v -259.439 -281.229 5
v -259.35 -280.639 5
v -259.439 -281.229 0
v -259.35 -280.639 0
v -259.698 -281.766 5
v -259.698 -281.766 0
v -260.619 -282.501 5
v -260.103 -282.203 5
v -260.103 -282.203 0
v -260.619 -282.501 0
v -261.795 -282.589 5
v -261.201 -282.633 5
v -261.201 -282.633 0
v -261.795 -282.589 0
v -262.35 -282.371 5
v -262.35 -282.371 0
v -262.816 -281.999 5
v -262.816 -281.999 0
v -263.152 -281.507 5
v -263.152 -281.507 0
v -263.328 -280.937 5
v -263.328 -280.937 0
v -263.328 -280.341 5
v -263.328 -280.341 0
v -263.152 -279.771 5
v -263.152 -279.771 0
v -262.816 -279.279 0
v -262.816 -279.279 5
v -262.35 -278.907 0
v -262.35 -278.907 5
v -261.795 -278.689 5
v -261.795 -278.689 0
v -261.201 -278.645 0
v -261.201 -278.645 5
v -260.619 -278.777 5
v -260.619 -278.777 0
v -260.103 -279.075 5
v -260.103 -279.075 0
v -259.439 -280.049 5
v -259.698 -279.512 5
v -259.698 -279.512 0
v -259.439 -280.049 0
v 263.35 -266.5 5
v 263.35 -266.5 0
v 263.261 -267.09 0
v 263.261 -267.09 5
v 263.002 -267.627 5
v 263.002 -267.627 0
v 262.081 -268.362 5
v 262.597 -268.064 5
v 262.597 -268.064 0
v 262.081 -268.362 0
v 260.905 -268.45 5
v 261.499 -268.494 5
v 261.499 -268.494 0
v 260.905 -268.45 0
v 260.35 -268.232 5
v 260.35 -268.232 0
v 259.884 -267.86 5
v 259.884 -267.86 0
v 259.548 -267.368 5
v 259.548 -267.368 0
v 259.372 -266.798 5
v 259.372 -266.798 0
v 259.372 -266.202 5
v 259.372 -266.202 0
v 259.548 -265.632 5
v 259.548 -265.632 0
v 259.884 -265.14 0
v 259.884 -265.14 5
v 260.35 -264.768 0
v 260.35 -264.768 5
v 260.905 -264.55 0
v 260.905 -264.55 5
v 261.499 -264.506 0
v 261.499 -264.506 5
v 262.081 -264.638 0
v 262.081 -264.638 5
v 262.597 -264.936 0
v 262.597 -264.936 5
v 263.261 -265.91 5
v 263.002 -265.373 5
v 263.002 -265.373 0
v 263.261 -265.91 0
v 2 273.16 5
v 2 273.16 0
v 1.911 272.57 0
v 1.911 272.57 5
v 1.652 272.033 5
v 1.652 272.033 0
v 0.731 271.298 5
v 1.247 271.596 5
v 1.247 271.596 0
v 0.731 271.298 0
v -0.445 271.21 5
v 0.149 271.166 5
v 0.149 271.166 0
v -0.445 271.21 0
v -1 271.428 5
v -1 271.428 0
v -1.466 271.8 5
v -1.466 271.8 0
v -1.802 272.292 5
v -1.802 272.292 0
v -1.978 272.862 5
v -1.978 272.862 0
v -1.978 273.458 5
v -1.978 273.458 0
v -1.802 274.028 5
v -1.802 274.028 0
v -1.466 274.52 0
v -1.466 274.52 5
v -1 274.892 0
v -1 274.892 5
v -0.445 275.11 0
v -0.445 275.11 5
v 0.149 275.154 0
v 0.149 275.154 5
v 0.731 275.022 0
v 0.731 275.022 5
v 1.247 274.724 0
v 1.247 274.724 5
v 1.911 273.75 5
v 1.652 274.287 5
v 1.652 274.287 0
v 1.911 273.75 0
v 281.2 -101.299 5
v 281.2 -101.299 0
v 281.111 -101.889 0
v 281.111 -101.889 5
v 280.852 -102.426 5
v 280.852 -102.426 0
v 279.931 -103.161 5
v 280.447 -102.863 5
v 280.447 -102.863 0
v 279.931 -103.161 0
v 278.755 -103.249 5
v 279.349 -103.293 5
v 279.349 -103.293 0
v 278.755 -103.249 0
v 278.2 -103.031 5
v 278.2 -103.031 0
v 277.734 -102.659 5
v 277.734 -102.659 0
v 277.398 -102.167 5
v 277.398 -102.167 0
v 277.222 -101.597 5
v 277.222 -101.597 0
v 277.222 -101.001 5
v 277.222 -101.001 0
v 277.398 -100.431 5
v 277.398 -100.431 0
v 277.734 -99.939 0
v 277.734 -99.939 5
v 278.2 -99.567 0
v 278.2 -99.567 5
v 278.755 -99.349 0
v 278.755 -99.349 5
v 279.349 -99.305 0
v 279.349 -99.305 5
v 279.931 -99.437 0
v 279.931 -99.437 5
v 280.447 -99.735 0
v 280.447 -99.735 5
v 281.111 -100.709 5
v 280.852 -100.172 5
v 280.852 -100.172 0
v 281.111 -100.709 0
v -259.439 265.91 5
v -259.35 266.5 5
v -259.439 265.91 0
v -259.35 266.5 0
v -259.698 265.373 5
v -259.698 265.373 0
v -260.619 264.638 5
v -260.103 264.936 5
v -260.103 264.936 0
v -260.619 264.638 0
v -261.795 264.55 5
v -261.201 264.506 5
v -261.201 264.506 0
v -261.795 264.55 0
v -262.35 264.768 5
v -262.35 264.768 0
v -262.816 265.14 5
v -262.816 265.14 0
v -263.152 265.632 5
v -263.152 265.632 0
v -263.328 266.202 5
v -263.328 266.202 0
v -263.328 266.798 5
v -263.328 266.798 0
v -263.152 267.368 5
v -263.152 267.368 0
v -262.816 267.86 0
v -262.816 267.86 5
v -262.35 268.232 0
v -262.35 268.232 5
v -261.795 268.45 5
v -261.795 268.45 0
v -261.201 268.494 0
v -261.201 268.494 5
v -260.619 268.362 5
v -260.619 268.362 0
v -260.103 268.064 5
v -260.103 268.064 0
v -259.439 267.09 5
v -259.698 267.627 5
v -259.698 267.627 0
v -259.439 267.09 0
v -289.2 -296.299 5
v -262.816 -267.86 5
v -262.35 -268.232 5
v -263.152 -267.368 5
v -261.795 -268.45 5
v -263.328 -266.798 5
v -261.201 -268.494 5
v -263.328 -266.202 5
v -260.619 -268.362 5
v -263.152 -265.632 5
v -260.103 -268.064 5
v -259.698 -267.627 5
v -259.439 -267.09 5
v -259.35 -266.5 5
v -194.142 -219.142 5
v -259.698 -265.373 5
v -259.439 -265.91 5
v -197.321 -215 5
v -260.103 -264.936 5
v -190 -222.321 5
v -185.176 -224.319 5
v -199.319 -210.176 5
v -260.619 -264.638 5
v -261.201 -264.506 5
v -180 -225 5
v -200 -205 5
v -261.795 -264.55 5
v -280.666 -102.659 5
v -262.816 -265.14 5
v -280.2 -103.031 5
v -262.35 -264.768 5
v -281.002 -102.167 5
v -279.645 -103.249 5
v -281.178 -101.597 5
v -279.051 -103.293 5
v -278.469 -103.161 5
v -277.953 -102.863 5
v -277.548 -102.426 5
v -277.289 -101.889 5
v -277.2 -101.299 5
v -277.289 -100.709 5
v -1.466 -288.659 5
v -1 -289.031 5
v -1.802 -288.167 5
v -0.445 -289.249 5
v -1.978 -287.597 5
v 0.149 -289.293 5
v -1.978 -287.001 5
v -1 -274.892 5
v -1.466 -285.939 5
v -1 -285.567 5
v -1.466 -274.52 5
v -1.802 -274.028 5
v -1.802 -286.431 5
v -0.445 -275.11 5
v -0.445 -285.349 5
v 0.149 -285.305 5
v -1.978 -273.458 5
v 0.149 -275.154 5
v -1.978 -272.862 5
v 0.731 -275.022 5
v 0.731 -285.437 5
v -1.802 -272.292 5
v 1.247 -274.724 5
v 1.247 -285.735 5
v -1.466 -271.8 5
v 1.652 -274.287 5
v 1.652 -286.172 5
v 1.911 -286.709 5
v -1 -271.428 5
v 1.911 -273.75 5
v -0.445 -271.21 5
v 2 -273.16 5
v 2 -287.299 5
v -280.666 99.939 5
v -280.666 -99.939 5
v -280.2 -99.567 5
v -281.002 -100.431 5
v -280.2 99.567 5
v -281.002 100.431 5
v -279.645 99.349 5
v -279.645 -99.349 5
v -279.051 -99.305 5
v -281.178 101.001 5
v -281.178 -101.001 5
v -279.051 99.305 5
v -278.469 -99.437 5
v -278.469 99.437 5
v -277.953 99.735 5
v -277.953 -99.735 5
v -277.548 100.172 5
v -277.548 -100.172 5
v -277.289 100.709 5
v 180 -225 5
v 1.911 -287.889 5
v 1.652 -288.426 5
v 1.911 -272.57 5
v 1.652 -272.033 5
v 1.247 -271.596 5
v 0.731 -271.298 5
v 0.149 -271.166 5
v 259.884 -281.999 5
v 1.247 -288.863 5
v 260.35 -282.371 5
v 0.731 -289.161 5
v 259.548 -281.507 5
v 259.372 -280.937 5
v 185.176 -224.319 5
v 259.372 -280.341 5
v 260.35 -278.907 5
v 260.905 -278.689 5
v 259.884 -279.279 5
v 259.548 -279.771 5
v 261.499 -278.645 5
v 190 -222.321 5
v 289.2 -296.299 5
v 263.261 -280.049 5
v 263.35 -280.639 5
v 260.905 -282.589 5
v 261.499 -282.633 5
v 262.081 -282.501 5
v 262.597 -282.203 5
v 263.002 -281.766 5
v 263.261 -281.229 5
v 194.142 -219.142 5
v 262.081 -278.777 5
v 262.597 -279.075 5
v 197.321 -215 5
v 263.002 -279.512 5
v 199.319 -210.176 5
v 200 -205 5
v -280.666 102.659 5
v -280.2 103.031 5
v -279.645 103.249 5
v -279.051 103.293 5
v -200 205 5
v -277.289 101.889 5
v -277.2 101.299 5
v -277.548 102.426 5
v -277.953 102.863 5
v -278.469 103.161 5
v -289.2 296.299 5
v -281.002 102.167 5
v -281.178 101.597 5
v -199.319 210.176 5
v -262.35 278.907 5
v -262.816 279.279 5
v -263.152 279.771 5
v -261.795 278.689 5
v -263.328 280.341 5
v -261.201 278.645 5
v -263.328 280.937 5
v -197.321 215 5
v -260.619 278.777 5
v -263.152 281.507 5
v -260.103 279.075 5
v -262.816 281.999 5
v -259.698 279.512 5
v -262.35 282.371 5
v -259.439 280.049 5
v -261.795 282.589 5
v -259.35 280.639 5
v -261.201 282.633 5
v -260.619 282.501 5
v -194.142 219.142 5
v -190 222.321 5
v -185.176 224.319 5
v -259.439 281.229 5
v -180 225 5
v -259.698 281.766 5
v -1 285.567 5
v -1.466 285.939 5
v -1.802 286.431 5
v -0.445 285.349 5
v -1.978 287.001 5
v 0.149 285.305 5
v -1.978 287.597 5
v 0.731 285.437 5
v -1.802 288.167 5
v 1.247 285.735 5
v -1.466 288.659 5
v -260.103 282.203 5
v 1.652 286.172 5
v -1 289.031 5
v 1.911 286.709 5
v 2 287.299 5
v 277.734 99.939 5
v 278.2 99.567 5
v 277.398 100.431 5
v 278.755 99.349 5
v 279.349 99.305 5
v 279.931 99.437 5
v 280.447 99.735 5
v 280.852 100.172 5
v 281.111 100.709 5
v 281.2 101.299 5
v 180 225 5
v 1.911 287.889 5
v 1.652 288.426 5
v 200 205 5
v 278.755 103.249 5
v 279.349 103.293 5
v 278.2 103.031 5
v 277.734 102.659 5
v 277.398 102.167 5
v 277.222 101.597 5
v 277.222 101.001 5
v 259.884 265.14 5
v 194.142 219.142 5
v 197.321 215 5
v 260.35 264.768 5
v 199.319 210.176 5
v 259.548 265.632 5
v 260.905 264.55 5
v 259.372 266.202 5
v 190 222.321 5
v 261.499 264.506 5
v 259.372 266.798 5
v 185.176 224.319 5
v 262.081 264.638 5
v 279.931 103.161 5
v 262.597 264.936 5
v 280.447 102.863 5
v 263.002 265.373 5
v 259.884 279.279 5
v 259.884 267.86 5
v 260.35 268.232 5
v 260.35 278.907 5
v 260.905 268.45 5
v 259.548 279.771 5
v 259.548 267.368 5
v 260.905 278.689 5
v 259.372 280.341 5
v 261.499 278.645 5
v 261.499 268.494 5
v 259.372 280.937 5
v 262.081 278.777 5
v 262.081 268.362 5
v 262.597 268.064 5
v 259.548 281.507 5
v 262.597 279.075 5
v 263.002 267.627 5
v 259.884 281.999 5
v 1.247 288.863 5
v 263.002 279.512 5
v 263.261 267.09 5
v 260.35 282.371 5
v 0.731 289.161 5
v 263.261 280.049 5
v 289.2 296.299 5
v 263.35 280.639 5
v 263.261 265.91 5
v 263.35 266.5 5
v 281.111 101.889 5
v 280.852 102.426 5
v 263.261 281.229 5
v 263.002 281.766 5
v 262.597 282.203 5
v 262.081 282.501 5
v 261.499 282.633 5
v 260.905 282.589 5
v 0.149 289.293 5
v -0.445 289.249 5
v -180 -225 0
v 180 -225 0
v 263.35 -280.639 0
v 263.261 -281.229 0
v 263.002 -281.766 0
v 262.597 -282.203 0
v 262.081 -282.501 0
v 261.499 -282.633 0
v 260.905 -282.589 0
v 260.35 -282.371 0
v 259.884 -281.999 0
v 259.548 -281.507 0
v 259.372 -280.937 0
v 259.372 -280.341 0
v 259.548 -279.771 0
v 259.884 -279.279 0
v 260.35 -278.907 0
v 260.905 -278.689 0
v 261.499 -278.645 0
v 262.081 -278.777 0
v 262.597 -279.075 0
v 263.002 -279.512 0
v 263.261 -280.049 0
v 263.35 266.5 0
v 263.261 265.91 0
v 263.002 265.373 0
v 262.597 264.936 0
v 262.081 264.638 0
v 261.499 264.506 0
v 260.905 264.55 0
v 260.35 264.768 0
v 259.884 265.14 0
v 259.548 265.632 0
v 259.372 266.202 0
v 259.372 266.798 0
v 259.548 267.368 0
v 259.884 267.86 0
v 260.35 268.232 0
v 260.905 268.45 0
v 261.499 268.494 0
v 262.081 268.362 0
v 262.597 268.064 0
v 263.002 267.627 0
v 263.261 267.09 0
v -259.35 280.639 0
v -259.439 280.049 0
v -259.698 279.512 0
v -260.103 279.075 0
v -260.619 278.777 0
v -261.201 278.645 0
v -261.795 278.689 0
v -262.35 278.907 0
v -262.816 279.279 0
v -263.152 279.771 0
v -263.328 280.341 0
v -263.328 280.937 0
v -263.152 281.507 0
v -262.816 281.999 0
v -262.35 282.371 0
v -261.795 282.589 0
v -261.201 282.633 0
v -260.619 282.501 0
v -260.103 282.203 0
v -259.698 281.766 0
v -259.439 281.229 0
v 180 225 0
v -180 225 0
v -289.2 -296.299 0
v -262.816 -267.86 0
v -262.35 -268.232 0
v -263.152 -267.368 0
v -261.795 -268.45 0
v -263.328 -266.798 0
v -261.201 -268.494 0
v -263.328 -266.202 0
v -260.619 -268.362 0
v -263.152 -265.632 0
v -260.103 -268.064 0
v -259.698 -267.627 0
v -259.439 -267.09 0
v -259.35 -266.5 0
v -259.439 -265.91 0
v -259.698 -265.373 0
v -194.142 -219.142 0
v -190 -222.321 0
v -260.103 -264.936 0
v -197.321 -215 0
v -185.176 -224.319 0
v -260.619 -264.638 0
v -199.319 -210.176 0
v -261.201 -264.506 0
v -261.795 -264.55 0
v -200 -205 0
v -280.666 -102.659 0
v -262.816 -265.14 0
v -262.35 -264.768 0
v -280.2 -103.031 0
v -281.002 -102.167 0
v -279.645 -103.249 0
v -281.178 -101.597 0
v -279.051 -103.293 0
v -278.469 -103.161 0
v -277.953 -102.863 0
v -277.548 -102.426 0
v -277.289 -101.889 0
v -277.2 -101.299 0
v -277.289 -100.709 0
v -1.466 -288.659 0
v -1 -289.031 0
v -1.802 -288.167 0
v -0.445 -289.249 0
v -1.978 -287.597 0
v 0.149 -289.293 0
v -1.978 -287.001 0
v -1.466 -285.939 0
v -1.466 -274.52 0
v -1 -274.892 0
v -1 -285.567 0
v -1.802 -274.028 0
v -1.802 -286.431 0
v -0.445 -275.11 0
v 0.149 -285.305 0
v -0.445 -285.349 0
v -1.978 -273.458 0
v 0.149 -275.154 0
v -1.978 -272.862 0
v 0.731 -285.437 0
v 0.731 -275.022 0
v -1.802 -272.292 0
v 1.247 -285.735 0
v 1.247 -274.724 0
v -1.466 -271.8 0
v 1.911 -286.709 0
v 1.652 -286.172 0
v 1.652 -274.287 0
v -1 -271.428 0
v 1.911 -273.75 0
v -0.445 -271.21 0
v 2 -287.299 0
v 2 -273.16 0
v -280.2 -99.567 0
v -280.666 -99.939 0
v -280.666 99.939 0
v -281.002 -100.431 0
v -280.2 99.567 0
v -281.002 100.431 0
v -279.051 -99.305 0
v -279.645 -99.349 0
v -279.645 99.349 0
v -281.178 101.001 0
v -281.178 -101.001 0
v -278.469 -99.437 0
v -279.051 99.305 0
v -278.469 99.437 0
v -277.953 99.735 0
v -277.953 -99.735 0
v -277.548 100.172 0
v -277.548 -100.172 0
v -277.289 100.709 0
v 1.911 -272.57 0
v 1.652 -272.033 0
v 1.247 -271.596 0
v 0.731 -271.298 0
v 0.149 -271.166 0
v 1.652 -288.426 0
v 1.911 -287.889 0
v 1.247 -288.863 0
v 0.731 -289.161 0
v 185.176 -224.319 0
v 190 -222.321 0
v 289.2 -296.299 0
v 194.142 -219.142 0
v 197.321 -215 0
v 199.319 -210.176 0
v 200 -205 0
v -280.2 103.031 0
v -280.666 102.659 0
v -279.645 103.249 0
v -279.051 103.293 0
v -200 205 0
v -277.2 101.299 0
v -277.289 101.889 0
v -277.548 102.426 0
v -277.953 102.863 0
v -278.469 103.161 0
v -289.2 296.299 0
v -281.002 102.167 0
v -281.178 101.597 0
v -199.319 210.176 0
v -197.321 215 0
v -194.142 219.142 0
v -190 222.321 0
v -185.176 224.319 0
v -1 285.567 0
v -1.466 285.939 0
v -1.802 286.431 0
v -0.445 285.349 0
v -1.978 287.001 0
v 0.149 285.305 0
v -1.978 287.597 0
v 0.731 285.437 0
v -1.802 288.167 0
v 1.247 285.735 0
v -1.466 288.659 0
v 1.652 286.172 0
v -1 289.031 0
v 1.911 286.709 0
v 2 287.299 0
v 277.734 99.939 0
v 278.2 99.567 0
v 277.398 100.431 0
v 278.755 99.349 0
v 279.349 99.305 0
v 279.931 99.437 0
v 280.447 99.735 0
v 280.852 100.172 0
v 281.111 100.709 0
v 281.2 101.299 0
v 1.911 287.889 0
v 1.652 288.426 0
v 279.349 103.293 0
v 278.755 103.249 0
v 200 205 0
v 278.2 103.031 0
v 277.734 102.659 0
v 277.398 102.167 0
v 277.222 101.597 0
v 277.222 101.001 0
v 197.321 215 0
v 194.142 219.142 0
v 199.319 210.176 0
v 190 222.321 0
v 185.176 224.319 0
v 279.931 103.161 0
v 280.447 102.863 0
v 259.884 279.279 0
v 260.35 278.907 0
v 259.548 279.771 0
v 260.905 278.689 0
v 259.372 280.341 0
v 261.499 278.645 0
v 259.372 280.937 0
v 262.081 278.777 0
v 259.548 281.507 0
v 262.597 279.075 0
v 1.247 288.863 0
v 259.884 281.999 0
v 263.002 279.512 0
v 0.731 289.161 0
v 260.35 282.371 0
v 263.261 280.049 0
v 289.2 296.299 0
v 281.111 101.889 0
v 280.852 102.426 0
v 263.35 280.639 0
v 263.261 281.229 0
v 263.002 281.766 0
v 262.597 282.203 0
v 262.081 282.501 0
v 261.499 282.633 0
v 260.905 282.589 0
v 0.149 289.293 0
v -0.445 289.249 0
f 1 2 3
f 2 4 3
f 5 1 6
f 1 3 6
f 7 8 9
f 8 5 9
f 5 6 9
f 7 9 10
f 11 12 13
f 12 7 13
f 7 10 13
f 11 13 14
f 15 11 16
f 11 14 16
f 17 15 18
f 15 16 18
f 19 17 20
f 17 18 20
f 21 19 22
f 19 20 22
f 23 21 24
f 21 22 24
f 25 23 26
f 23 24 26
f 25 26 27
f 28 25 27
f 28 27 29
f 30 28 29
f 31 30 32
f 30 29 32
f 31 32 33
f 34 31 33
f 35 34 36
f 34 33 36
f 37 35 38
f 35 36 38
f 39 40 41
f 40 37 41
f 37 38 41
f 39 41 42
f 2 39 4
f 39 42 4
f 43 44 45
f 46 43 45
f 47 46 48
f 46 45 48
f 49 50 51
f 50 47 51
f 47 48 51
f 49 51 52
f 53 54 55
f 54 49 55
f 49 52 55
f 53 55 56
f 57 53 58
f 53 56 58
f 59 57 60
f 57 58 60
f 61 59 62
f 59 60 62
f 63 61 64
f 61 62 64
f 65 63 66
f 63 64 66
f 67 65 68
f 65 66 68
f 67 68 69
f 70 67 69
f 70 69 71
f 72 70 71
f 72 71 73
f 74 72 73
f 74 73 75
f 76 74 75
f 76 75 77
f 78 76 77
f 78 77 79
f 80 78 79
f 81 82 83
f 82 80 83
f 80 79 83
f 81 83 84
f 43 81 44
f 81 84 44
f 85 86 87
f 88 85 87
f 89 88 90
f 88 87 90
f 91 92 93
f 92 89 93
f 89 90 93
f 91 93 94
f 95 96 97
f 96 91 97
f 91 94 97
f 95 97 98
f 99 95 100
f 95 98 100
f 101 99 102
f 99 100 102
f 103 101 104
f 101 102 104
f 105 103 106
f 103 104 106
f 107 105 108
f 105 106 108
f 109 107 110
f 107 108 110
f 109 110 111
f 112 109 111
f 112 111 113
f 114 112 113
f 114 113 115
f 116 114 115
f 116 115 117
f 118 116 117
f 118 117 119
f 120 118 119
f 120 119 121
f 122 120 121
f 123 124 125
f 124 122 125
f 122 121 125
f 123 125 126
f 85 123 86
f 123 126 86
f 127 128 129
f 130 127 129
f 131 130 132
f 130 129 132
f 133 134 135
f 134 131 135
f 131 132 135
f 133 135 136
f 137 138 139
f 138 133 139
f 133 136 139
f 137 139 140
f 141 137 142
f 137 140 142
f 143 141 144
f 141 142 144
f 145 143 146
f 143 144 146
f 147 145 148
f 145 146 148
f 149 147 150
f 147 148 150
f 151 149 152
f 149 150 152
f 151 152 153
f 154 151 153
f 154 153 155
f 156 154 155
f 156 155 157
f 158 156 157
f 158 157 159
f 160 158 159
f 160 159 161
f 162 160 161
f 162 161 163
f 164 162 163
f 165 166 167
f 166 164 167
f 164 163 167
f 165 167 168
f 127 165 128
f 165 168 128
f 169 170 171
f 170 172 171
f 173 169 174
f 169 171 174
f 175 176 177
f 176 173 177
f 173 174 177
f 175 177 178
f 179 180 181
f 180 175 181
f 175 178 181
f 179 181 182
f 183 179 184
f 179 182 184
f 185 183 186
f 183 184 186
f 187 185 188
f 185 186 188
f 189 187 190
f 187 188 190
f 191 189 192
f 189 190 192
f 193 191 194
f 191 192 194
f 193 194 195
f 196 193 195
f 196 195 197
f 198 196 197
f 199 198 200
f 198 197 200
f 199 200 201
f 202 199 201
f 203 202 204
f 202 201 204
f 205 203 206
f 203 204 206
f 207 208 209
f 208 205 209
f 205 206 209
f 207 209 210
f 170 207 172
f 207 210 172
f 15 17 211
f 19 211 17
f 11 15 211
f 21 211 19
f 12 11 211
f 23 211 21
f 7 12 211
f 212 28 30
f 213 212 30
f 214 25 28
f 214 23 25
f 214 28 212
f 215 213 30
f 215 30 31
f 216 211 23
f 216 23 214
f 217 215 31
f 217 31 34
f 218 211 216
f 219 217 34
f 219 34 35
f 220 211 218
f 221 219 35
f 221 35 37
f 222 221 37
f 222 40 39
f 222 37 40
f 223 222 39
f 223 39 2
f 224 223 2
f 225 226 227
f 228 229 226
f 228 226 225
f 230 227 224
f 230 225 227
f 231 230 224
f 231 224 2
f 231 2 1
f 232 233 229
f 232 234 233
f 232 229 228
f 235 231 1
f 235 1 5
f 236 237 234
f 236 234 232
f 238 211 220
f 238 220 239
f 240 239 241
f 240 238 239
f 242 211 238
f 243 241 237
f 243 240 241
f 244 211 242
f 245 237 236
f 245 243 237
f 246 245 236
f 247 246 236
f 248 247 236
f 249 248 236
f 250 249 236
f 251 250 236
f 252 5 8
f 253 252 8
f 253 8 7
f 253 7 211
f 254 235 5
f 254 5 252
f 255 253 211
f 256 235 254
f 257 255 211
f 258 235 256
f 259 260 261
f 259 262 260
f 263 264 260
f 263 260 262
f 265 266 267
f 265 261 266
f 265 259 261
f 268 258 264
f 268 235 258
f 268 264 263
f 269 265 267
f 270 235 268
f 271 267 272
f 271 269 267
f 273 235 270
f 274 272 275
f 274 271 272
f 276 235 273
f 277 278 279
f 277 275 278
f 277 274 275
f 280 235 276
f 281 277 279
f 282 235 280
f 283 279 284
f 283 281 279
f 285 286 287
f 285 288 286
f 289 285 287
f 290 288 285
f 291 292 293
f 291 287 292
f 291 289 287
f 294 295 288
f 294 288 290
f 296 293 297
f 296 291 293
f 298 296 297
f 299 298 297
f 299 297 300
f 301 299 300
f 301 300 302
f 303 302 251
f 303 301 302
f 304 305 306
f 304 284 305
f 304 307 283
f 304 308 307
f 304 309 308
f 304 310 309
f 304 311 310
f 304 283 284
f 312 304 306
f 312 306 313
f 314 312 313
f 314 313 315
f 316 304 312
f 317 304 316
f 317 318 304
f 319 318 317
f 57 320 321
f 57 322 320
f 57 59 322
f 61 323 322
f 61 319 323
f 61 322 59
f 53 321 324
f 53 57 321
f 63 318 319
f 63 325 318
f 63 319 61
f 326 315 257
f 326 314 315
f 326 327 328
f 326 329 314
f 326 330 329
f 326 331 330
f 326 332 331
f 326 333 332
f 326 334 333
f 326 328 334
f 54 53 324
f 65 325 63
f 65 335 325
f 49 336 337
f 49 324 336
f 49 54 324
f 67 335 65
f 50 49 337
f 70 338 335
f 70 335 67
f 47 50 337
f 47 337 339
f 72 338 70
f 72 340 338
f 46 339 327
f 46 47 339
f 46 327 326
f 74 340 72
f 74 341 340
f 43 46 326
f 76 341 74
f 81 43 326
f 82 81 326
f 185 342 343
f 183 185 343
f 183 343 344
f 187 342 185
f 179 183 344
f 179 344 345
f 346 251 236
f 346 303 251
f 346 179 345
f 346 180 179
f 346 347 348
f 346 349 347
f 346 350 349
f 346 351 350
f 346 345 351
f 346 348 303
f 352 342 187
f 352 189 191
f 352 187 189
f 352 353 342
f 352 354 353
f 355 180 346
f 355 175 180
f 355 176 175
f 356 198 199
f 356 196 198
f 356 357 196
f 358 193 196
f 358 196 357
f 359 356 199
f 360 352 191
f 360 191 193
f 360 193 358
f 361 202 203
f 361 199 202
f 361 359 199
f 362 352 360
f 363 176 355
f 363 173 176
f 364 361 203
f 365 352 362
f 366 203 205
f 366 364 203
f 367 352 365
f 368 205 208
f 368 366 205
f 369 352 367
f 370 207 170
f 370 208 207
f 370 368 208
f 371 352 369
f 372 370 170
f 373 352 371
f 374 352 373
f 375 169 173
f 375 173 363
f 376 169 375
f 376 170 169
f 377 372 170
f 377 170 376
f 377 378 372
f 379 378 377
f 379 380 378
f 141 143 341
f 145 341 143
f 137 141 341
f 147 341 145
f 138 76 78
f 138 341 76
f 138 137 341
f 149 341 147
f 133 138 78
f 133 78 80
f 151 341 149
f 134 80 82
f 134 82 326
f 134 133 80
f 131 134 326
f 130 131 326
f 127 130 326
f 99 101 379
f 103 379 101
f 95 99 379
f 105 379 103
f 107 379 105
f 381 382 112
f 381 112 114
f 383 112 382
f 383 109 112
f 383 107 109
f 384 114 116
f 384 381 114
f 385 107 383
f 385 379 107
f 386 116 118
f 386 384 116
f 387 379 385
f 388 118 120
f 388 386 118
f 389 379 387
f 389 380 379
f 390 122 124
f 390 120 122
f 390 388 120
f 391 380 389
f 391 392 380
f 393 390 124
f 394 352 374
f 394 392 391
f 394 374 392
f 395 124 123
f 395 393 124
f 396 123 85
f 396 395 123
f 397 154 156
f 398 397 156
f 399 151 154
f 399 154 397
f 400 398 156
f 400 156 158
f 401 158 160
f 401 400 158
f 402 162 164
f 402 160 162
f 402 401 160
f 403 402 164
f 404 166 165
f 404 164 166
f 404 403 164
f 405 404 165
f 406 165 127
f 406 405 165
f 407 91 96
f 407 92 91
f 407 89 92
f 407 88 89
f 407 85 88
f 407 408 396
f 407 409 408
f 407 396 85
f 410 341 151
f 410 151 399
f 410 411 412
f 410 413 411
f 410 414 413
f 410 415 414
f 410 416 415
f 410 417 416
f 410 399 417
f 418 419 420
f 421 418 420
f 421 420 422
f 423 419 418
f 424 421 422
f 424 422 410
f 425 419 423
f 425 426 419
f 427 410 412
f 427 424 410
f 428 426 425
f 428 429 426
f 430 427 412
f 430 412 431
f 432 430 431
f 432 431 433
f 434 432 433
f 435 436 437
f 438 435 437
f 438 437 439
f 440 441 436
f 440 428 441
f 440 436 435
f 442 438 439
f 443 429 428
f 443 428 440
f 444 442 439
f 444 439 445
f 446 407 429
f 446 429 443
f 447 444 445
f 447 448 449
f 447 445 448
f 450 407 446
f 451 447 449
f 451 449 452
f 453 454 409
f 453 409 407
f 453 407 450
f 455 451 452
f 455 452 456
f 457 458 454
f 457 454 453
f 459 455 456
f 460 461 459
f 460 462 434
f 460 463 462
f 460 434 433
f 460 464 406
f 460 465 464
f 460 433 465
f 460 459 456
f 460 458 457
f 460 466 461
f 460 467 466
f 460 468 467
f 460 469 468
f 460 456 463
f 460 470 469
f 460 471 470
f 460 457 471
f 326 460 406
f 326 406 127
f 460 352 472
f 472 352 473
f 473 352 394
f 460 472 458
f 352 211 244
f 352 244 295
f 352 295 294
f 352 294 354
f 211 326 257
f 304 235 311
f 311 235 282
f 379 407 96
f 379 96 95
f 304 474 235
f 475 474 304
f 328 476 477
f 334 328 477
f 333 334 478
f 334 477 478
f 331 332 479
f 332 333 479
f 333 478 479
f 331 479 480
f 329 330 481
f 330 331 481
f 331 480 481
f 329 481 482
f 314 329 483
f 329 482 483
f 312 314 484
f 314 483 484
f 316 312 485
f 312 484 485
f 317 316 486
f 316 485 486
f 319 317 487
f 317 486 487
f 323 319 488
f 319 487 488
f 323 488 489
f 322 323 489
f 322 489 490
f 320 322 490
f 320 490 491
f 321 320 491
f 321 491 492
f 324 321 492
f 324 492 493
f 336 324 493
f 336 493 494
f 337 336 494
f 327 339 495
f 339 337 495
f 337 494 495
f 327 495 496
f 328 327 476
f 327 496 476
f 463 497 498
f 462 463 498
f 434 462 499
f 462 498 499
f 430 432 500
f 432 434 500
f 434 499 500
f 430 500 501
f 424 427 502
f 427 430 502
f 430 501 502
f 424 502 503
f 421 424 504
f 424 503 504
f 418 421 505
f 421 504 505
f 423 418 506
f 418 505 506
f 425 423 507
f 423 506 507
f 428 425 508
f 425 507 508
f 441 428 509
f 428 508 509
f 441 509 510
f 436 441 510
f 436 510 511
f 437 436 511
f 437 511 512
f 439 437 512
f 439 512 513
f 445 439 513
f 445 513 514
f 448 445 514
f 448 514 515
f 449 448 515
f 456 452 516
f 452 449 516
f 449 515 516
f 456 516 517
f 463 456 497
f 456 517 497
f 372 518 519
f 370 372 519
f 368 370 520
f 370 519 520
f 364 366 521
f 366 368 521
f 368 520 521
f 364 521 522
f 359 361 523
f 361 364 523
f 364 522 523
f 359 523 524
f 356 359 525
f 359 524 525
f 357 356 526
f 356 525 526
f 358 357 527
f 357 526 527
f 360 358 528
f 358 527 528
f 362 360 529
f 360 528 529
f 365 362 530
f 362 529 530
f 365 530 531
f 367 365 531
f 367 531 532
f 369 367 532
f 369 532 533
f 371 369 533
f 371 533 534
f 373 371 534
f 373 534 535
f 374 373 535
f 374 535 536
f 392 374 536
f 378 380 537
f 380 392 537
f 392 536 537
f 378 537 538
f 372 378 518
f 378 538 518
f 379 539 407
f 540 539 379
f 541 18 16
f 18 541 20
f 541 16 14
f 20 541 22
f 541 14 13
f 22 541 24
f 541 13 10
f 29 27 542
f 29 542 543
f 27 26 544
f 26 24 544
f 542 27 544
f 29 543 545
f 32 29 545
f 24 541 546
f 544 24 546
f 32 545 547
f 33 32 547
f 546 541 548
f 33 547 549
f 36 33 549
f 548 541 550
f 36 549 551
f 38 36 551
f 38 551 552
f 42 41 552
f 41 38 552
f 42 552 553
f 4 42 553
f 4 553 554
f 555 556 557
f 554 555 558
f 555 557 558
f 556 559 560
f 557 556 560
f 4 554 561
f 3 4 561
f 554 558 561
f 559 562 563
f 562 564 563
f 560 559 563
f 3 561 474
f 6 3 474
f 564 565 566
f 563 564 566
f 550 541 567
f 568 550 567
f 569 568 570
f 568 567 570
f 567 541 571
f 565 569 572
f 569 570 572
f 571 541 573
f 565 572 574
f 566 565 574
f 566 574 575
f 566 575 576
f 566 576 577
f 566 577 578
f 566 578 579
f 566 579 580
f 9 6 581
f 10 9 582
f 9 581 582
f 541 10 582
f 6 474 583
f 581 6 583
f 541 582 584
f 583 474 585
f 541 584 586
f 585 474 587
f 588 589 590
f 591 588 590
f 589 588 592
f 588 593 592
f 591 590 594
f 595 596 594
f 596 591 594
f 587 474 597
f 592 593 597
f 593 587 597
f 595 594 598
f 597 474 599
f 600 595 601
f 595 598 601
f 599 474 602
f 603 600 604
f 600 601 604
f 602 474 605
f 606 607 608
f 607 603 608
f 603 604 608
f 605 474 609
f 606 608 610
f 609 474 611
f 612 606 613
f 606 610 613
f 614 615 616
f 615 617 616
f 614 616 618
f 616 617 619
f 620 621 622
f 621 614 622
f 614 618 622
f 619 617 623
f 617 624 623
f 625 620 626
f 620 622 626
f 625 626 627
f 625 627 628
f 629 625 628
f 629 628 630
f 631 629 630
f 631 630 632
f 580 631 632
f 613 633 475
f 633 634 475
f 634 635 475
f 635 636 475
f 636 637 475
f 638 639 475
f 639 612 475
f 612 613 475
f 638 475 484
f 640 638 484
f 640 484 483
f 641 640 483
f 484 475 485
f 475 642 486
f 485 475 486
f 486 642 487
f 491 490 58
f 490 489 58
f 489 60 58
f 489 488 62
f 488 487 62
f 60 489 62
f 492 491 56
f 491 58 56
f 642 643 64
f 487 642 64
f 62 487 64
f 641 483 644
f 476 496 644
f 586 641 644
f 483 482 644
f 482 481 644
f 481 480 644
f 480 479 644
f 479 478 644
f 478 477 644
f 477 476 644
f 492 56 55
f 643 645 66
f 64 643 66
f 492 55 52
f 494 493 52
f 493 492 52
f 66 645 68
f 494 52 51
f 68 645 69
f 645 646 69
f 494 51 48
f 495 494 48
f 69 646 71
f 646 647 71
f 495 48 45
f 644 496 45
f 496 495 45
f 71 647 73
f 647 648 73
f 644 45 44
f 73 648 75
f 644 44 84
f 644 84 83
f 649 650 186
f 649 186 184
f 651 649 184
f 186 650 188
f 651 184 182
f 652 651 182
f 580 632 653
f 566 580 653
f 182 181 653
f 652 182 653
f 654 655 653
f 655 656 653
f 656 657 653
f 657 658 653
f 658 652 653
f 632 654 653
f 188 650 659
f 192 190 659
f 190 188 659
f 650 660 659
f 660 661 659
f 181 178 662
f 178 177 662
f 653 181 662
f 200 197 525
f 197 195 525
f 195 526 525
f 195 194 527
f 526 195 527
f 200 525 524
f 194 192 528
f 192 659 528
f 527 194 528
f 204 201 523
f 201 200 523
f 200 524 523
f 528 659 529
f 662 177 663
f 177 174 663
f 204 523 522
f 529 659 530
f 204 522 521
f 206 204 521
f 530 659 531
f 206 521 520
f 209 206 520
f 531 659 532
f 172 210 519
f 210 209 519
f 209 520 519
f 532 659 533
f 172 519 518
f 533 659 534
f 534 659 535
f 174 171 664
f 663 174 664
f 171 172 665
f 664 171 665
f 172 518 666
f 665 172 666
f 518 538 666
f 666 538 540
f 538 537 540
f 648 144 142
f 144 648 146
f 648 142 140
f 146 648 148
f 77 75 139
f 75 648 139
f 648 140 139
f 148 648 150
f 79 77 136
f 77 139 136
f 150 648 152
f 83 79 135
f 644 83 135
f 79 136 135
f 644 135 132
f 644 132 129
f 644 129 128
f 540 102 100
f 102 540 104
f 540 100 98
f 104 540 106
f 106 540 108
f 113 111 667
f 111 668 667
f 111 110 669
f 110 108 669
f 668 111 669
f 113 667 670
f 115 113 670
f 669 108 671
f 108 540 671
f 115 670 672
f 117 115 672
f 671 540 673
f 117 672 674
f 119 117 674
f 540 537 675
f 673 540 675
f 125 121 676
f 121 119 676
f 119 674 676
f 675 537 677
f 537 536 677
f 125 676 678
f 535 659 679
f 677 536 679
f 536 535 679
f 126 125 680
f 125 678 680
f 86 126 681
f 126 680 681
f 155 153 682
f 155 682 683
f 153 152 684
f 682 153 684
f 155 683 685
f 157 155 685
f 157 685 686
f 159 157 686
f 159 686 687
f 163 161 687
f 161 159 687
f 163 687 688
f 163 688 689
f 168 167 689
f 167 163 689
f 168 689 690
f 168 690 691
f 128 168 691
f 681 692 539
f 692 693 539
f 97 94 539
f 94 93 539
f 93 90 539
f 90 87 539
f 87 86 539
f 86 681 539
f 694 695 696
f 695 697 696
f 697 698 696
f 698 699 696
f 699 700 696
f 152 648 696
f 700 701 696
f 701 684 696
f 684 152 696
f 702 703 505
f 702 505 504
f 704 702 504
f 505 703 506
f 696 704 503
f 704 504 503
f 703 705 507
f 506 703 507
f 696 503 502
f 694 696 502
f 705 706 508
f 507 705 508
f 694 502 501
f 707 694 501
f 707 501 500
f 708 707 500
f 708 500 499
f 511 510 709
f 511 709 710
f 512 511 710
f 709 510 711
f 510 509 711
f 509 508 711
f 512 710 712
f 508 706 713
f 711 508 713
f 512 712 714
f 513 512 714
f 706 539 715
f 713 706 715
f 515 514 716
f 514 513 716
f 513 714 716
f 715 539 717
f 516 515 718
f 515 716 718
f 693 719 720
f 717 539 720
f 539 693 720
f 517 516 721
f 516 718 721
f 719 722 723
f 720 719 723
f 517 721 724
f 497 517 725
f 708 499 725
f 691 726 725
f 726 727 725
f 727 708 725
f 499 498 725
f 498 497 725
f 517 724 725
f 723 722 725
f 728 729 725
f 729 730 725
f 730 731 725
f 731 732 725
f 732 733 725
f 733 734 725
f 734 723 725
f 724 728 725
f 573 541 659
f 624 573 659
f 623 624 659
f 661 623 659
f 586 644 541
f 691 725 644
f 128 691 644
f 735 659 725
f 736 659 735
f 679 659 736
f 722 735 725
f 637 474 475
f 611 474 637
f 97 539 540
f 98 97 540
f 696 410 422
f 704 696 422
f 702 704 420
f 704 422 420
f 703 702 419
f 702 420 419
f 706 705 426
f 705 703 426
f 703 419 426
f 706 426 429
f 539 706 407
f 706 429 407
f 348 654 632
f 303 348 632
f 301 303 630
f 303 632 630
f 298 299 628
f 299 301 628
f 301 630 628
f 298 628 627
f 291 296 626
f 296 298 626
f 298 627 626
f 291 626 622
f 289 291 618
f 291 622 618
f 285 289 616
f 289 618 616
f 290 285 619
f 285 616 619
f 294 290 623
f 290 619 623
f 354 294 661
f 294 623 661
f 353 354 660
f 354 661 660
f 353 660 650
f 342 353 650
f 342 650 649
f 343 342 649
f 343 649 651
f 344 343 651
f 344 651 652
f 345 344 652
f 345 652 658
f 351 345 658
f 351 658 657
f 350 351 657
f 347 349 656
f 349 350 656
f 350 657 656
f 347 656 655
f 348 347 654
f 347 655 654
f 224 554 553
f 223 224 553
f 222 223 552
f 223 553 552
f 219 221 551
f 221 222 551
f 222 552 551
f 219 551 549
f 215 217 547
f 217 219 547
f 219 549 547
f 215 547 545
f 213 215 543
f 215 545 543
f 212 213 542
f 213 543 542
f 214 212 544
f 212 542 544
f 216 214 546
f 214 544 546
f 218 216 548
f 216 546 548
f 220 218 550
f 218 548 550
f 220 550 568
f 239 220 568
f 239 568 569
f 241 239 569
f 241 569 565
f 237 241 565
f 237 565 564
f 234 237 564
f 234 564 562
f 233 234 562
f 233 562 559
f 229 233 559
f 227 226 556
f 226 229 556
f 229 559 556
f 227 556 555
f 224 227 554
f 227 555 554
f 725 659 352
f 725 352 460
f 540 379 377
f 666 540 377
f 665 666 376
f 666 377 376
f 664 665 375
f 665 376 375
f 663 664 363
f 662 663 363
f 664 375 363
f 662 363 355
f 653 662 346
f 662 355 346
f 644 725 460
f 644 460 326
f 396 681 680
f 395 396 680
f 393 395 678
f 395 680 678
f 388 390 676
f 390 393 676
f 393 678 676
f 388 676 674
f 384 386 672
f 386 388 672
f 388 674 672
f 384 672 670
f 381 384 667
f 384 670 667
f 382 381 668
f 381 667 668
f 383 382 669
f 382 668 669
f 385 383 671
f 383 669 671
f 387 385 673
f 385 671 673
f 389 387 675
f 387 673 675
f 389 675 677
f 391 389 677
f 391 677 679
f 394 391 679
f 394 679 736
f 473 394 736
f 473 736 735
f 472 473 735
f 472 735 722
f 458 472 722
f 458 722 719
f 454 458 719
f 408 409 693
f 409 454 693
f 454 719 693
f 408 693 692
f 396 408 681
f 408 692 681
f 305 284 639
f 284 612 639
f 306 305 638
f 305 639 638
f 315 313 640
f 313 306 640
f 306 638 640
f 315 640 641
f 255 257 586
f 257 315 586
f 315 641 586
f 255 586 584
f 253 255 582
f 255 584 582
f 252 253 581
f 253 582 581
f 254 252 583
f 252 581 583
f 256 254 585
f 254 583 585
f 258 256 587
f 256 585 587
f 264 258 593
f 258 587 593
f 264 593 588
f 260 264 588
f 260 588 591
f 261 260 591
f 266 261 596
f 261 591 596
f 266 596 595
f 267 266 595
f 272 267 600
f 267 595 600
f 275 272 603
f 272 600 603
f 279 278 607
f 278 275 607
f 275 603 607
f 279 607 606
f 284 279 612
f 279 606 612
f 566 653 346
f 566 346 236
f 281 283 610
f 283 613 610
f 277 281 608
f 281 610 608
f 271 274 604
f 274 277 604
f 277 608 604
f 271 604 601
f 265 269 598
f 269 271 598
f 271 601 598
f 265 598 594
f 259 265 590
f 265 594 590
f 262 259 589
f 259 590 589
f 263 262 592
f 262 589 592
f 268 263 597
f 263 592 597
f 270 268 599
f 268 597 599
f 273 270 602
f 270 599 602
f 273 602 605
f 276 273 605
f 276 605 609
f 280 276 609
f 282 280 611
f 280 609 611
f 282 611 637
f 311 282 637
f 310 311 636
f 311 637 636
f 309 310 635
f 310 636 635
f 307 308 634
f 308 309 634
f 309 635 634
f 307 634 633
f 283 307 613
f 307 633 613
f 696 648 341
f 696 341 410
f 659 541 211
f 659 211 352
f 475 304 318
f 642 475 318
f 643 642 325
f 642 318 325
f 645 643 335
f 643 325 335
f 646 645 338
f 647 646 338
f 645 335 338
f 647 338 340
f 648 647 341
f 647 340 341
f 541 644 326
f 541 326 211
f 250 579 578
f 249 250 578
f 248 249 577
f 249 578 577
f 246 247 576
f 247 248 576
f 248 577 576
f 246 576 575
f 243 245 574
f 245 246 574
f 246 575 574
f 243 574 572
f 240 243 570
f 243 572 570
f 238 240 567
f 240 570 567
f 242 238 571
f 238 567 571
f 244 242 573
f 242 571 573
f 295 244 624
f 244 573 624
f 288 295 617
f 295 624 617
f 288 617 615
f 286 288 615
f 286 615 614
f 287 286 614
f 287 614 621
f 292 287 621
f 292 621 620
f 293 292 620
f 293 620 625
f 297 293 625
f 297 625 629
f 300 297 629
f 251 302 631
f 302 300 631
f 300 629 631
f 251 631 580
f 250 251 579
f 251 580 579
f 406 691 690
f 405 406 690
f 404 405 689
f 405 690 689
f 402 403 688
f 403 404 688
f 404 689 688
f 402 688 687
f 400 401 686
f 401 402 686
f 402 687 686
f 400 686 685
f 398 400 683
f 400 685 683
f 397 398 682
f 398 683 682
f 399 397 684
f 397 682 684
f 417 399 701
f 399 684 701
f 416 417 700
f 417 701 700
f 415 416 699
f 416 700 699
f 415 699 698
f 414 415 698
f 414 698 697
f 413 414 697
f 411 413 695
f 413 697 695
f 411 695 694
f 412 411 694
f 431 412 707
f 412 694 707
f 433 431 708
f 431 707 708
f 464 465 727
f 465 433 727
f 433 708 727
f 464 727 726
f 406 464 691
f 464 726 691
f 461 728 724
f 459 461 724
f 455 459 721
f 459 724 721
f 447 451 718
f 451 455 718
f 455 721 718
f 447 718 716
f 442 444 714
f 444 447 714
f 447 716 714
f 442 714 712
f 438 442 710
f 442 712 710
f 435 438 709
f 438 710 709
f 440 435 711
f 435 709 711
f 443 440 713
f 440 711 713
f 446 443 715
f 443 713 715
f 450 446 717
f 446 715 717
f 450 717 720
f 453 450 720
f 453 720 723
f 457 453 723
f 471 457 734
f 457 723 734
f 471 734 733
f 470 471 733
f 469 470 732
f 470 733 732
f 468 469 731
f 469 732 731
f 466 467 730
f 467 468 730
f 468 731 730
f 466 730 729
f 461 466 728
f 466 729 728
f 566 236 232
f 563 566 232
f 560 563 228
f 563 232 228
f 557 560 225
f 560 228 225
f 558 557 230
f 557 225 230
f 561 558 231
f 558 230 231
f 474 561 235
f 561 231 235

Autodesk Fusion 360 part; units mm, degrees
sketch "Sketch1" plane through (0, 0, 0) normal (0, 0, 1) x (1, 0, 0)
  line L0 (284.2, -291.299) -> (-284.2, -291.299)
  line L1 (-284.2, -291.299) -> (-284.2, 291.299)
  line L2 (-284.2, 291.299) -> (284.2, 291.299)
  line L3 (284.2, 291.299) -> (284.2, -291.299)
  line L4 (284.2, -291.299) -> (-284.2, 291.299) construction
  line L5 (-284.2, -291.299) -> (284.2, 291.299) construction
  line L6 (-261.35, 291.299) -> (-261.35, -291.299) construction
  circle A0 centre (-261.35, 280.639) radius 2
  circle A1 centre (-261.35, 266.5) radius 2
  circle A2 centre (-261.35, -280.639) radius 2
  circle A3 centre (-261.35, -266.5) radius 2
  line L7 (261.35, 291.299) -> (261.35, -291.299) construction
  circle A4 centre (261.35, 280.639) radius 2
  circle A5 centre (261.35, 266.5) radius 2
  circle A6 centre (261.35, -280.639) radius 2
  circle A7 centre (261.35, -266.5) radius 2
  line L8 (-261.35, -266.5) -> (261.35, -266.5) construction
  circle A8 centre (0, -273.16) radius 2
  line L9 (0, -291.299) -> (0, 291.299) construction
  circle A9 centre (0, 273.16) radius 2
  circle A10 centre (0, 287.299) radius 2
  circle A11 centre (0, -287.299) radius 2
  line L10 (200, 225) -> (-200, 225)
  line L11 (-200, 225) -> (-200, -225)
  line L12 (-200, -225) -> (200, -225)
  line L13 (200, -225) -> (200, 225)
  line L14 (200, 225) -> (-200, -225) construction
  line L15 (-200, 225) -> (200, -225) construction
  line L16 (-289.2, 296.299) -> (289.2, 296.299)
  line L17 (289.2, 296.299) -> (289.2, -296.299)
  line L18 (289.2, -296.299) -> (-289.2, -296.299)
  line L19 (-289.2, -296.299) -> (-289.2, 296.299)
  circle A12 centre (279.2, 101.299) radius 2
  circle A13 centre (279.2, -101.299) radius 2
  circle A14 centre (-279.2, -101.299) radius 2
  circle A15 centre (-279.2, 101.299) radius 2
  line L20 (-304.8, -372.499) -> (304.8, -372.499) construction
  line L21 (304.8, -372.499) -> (304.8, 541.901) construction
  line L22 (304.8, 541.901) -> (-304.8, 541.901) construction
  line L23 (-304.8, 541.901) -> (-304.8, -372.499) construction
  line L24 (0, -372.499) -> (0, -296.299) construction
  line L25 (-261.35, 266.5) -> (261.35, 266.5) construction
  line L26 (261.35, -280.639) -> (-261.35, -280.639) construction
  line L27 (261.35, 280.639) -> (-261.35, 280.639) construction
  dimension "d1" = 568.4
  dimension "d2" = 582.598
  dimension "d3" = 22.85
  dimension "d4" = 4
  dimension "d6" = 4
  dimension "d8" = 4
  dimension "d9" = 4
  dimension "d12" = 22.85
  dimension "d13" = 4
  dimension "d14" = 4
  dimension "d17" = 4
  dimension "d18" = 4
  dimension "d21" = 4
  dimension "d22" = 4
  dimension "d23" = 4
  dimension "d24" = 4
  dimension "d28" = 450
  dimension "d29" = 400
  dimension "d30" = 5
  dimension "d31" = 5
  dimension "d32" = 5
  dimension "d33" = 5
  dimension "d37" = 4
  dimension "d38" = 4
  dimension "d39" = 4
  dimension "d40" = 4
  dimension "d41" = 190
  dimension "d42" = 190
  dimension "d43" = 5
  dimension "d44" = 5
  dimension "d45" = 190
  dimension "d46" = 190
  dimension "d47" = 5
  dimension "d49" = 5
  dimension "d51" = 609.6
  dimension "d52" = 76.2
  dimension "d53" = 914.4
  dimension "d54" = 24.799
  dimension "d55" = 24.799
  dimension "d56" = 10.66
  dimension "d57" = 10.66
  dimension "d61" = 4
  dimension "d62" = 14.139
  dimension "d63" = 14.139
  dimension "d64" = 4
extrude "Extrude1" add sketch "Sketch1" along normal blind 5 contours L0 L1 L2 L3 | L16 L17 L18 L19 makes body 1
fillet "Fillet1" radius 20 4 edges at (-200, -225, 2.5) (200, -225, 2.5) (200, 225, 2.5) (-200, 225, 2.5) on bodies 1
copy_body "Body->Comp1" bodies 1 removing the originals makes body 2 in component "Front Panel"
component "Front Panel" placed x (1, 0, 0) y (0, 1, 0) z (0, 0, 1) at (0, 0, 0)
equation "d1 = XRailLength + 218.4 mm"
equation "d2 = PrintHeight + 282.598 mm"
equation "d28 = PrintHeight + 150 mm"
equation "d29 = XRailLength + 50 mm"
equation "d30 = WallThickness"
equation "d31 = WallThickness"
equation "d32 = WallThickness"
equation "d33 = WallThickness"
equation "WallThickness = 5 mm"
equation "XRailLength = 350 mm"
equation "PrintHeight = 300 mm"
